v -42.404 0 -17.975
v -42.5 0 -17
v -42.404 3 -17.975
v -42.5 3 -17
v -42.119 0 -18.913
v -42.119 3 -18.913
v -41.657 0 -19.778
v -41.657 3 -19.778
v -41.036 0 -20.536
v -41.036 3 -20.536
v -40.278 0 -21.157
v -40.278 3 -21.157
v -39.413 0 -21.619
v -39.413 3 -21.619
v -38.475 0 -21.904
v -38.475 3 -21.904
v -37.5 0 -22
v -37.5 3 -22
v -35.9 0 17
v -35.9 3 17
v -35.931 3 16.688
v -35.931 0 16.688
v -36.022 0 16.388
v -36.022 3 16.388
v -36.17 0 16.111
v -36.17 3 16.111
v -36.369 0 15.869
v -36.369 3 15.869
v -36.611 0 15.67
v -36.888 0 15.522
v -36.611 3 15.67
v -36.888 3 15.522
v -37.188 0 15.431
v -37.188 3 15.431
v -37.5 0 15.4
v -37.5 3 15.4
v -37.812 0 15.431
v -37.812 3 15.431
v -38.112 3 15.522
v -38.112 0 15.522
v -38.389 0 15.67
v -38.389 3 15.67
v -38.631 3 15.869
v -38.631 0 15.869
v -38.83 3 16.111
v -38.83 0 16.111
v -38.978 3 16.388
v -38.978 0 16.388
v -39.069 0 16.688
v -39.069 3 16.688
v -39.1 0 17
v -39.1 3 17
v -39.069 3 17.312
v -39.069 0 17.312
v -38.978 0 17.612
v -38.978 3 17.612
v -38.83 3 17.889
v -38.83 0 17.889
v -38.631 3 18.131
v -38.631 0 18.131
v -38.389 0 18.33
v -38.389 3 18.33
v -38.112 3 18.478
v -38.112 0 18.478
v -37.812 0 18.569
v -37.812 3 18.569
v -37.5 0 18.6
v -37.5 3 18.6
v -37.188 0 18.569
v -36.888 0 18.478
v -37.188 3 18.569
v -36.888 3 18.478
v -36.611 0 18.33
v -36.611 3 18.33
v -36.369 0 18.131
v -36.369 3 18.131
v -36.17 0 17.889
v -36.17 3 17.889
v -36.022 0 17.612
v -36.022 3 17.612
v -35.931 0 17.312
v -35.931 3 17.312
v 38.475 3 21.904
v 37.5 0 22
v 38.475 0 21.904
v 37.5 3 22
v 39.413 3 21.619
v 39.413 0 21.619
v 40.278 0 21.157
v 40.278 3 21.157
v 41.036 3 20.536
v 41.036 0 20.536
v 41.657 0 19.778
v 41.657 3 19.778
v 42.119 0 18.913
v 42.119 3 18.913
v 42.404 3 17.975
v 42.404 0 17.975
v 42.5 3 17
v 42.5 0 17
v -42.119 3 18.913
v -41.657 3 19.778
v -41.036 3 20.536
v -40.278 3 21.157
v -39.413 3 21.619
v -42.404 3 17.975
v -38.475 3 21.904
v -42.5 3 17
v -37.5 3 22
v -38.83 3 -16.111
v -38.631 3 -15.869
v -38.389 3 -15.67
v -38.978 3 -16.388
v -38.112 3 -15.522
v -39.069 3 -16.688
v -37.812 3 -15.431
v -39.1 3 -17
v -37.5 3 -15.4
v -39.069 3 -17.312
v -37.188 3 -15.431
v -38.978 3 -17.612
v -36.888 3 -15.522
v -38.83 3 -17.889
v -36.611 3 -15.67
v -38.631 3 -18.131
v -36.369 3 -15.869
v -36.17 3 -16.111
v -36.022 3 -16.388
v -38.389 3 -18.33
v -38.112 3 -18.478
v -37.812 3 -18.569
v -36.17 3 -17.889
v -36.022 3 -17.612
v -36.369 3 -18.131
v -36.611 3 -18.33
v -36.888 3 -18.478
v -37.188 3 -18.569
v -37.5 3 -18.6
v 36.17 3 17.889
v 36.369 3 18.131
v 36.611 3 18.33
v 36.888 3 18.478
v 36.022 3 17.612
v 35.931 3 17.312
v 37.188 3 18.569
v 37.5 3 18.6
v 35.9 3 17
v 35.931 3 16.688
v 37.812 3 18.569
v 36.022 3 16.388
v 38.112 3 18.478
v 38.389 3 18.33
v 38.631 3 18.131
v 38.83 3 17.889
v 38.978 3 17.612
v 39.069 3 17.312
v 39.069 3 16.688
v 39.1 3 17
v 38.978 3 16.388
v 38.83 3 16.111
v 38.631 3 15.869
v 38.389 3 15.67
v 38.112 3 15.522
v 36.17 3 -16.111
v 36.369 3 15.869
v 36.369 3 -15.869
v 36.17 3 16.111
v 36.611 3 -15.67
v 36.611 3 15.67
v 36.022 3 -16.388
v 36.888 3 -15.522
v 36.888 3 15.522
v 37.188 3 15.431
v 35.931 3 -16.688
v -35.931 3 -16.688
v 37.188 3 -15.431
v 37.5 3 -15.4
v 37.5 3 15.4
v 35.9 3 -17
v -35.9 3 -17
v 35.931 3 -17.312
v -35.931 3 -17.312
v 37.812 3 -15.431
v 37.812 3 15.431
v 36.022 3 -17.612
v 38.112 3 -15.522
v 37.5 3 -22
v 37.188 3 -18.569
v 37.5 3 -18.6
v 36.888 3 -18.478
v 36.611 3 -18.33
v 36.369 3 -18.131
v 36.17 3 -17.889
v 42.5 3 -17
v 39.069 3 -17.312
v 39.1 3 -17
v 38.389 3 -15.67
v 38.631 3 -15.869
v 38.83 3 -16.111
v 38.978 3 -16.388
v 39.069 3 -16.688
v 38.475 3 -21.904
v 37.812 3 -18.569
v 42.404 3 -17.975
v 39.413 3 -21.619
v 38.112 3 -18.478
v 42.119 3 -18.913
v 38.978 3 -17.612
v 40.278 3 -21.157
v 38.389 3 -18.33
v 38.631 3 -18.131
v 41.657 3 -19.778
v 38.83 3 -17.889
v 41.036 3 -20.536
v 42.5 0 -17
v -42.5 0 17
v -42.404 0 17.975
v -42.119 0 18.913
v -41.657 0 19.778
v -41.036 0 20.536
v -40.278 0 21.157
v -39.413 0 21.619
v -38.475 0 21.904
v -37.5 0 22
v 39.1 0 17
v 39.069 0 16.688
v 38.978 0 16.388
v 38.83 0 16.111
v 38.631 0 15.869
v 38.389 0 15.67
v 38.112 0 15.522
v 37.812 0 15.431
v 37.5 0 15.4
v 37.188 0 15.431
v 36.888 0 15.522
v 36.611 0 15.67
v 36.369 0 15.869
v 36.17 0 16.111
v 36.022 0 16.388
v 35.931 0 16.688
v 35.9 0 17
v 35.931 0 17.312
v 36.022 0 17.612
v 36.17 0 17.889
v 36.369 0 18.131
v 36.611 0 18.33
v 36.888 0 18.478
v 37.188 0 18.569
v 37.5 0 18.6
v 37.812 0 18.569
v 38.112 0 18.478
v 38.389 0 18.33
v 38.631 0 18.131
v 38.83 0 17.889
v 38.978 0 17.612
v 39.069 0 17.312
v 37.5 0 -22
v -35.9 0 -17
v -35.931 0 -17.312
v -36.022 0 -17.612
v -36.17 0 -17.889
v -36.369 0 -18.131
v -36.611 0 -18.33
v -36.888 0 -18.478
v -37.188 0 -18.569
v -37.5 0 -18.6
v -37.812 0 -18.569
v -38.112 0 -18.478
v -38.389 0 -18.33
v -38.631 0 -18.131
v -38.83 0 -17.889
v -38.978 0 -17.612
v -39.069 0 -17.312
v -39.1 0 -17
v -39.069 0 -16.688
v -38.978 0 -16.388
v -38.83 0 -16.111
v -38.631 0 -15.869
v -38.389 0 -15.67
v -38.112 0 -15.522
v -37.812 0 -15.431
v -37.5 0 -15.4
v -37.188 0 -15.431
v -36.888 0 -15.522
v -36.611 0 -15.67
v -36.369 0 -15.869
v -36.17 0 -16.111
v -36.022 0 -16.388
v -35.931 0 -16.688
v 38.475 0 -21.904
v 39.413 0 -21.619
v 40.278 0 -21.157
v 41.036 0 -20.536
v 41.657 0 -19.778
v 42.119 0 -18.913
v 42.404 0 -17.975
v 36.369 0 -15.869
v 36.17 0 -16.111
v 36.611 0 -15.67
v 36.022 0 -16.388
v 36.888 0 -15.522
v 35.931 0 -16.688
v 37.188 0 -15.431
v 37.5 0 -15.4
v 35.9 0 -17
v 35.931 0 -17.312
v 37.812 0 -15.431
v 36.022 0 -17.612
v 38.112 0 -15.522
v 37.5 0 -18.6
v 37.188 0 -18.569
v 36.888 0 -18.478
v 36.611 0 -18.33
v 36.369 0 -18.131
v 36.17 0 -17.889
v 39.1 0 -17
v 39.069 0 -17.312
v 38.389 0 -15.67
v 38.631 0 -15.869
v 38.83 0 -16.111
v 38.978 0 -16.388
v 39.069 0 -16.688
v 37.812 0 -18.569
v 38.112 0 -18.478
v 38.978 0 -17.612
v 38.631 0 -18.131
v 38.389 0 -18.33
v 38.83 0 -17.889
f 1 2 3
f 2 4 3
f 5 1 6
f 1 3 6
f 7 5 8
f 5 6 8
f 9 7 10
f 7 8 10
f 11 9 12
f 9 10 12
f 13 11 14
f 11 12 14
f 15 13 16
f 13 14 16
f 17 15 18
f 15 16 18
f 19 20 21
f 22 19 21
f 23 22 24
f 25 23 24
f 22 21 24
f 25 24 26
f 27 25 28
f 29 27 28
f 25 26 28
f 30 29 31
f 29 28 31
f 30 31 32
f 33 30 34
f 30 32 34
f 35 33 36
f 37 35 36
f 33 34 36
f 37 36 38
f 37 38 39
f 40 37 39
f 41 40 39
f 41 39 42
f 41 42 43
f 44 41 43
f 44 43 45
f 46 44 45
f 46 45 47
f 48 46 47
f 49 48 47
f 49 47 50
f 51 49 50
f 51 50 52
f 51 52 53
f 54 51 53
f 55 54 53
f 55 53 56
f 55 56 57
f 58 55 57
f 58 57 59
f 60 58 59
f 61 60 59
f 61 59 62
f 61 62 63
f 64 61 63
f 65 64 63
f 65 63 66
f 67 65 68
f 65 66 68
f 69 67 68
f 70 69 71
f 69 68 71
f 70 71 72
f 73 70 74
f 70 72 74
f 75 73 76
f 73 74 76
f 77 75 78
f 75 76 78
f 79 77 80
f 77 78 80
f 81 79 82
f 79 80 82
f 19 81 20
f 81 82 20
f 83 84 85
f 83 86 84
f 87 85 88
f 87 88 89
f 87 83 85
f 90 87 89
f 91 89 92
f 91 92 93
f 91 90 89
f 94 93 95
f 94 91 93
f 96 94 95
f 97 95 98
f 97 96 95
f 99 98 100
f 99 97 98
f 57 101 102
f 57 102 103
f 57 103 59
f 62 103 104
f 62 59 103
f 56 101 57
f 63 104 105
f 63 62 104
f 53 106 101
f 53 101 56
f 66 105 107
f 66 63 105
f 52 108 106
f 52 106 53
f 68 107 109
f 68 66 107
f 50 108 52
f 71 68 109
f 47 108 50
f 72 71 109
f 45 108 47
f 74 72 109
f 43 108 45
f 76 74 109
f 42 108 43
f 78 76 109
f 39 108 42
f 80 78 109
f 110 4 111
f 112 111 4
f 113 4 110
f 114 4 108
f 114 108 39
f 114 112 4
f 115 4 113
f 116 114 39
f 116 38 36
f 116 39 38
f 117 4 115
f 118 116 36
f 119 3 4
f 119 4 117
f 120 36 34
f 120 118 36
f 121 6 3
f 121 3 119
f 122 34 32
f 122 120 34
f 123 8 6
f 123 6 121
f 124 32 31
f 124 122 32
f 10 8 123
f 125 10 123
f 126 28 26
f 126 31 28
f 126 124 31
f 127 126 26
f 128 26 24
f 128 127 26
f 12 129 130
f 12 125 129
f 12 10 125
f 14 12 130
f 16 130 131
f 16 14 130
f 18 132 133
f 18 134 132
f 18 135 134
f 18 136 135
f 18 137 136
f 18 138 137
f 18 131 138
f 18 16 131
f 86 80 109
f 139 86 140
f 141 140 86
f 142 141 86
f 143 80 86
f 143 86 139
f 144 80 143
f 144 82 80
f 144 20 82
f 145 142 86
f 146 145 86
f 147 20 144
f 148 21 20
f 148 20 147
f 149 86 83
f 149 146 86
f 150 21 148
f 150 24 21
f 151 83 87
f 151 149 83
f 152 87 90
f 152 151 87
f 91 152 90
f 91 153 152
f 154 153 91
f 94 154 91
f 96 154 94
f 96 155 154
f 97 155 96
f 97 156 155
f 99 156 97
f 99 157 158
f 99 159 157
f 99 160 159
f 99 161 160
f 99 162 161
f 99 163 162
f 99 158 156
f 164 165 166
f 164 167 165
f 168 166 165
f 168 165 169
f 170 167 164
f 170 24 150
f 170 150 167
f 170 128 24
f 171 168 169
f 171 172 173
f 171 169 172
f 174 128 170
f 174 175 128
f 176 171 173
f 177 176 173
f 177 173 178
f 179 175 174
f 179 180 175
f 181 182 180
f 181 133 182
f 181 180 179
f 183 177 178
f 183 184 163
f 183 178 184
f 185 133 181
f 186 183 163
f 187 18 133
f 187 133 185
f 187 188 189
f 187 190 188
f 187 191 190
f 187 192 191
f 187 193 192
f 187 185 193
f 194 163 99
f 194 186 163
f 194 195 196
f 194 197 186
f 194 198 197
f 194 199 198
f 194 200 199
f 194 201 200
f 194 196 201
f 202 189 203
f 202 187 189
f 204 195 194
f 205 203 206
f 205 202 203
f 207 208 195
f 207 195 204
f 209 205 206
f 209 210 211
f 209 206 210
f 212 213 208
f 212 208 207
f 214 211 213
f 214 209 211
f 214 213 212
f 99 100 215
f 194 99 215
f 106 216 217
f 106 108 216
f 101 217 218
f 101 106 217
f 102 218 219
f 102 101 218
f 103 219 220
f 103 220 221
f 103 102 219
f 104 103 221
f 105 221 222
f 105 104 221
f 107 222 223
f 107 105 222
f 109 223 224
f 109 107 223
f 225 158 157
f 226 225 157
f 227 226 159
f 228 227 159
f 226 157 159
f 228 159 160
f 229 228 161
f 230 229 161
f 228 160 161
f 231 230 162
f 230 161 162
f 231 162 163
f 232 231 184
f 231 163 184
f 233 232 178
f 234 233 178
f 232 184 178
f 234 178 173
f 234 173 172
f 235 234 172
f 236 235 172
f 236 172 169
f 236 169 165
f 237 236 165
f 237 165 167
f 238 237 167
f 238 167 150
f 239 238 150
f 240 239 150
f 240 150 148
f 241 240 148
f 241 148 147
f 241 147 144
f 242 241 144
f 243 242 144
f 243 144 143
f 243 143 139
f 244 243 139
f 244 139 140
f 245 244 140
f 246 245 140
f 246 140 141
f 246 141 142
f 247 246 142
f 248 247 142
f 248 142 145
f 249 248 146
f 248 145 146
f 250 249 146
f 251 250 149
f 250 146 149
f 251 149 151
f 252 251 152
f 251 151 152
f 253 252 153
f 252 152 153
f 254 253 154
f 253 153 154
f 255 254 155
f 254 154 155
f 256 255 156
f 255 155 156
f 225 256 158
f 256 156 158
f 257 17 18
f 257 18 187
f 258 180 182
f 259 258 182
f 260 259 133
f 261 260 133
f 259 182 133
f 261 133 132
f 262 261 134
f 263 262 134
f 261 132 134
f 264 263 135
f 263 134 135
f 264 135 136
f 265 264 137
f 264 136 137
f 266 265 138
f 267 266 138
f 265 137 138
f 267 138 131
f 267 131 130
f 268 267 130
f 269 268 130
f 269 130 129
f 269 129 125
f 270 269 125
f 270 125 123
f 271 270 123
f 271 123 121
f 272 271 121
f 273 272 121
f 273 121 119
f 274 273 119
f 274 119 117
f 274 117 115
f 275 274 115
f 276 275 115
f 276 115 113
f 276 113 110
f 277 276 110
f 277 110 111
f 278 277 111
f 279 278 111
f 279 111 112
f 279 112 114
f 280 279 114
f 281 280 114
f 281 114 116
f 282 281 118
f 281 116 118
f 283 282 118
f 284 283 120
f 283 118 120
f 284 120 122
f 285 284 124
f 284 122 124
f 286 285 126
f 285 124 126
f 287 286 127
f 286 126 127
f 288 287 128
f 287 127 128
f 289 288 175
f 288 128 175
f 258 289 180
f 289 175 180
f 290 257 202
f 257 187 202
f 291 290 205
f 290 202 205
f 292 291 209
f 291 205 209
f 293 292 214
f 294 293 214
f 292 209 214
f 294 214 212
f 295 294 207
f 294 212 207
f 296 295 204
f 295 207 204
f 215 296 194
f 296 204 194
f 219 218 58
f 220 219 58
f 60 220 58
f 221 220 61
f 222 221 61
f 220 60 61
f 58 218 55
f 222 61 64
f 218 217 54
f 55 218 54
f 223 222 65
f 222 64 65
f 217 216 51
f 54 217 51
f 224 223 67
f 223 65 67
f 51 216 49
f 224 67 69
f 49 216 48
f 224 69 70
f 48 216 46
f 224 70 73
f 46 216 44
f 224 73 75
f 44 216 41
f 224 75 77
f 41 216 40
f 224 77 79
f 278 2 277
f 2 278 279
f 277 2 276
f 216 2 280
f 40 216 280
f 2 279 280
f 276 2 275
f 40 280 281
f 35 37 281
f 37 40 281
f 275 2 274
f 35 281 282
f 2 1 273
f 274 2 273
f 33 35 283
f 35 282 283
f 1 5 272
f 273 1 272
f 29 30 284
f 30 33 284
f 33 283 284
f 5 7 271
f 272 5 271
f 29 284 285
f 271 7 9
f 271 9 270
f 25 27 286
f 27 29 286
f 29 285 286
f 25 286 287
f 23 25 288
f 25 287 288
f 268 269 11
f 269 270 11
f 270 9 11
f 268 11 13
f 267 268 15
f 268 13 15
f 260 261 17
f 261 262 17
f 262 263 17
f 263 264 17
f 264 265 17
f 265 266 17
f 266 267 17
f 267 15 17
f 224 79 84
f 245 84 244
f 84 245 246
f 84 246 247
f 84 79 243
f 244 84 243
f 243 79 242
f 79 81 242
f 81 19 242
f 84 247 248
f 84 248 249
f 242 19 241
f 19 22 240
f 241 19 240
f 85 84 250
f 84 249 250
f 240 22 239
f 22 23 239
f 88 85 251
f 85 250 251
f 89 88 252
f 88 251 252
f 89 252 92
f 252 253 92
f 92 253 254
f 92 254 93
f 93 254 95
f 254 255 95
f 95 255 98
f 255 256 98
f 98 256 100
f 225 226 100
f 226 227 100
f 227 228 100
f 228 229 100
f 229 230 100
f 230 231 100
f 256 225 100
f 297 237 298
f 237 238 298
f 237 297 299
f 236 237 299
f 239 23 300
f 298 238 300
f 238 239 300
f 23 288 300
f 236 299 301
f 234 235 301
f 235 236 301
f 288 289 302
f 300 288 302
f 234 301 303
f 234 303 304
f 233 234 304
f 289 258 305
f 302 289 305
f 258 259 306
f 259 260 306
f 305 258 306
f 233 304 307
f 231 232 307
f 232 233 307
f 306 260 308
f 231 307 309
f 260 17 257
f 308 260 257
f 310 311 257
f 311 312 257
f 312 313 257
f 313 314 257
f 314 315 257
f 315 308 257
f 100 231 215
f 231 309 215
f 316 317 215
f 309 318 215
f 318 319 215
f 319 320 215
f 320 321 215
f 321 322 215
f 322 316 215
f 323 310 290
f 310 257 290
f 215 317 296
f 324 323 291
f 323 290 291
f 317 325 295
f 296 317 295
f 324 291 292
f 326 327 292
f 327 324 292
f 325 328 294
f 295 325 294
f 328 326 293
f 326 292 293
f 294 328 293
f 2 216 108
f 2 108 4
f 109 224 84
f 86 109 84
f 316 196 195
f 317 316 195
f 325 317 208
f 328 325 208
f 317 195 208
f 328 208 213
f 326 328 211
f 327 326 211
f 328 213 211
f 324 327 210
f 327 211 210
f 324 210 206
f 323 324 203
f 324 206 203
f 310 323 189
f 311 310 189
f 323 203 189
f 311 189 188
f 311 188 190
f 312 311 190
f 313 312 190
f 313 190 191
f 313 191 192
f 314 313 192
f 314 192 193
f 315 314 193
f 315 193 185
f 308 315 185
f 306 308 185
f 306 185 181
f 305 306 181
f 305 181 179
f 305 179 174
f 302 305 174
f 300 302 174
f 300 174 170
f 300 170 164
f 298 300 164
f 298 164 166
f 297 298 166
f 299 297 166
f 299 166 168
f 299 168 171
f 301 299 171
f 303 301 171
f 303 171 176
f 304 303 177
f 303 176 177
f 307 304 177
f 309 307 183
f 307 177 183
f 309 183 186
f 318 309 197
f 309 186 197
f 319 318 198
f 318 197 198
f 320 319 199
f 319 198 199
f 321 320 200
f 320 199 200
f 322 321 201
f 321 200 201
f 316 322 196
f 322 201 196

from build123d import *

# Parameters (mm, degrees)
SKETCH_1_W          = 85
SKETCH_1_H          = 44
EXTRUDE_1_DEPTH     = 3
SKETCH_2_R          = 1.6
CUT_EXTRUDE_1_DEPTH = 4
FILLET_1_R          = 5


with BuildPart() as part:
    # 草图1 → 凸台-拉伸1 (new body)
    with BuildSketch(Plane(origin=(0, 0, 0), x_dir=(1, 0, 0), z_dir=(0, 1, 0))):
        Rectangle(SKETCH_1_W, SKETCH_1_H)
    extrude(amount=EXTRUDE_1_DEPTH)

    # 草图2 → 切除-拉伸1 (cut, through all)
    with BuildSketch(Plane(origin=(0, 3, 0), x_dir=(1, 0, 0), z_dir=(0, 1, 0))):
        with Locations((-37.5, 17)):
            Circle(SKETCH_2_R)
        with Locations((-37.5, -17)):
            Circle(SKETCH_2_R)
        with Locations((37.5, 17)):
            Circle(SKETCH_2_R)
        with Locations((37.5, -17)):
            Circle(SKETCH_2_R)
    extrude(amount=-CUT_EXTRUDE_1_DEPTH, mode=Mode.SUBTRACT)

    # 圆角1
    fillet_1_edges = [part.edges().sort_by_distance(p)[0] for p in [
        (-42.5, 1.5, -22),
        (42.5, 1.5, -22),
        (42.5, 1.5, 22),
        (-42.5, 1.5, 22),
    ]]
    fillet(fillet_1_edges, radius=FILLET_1_R)


solid = part.part
